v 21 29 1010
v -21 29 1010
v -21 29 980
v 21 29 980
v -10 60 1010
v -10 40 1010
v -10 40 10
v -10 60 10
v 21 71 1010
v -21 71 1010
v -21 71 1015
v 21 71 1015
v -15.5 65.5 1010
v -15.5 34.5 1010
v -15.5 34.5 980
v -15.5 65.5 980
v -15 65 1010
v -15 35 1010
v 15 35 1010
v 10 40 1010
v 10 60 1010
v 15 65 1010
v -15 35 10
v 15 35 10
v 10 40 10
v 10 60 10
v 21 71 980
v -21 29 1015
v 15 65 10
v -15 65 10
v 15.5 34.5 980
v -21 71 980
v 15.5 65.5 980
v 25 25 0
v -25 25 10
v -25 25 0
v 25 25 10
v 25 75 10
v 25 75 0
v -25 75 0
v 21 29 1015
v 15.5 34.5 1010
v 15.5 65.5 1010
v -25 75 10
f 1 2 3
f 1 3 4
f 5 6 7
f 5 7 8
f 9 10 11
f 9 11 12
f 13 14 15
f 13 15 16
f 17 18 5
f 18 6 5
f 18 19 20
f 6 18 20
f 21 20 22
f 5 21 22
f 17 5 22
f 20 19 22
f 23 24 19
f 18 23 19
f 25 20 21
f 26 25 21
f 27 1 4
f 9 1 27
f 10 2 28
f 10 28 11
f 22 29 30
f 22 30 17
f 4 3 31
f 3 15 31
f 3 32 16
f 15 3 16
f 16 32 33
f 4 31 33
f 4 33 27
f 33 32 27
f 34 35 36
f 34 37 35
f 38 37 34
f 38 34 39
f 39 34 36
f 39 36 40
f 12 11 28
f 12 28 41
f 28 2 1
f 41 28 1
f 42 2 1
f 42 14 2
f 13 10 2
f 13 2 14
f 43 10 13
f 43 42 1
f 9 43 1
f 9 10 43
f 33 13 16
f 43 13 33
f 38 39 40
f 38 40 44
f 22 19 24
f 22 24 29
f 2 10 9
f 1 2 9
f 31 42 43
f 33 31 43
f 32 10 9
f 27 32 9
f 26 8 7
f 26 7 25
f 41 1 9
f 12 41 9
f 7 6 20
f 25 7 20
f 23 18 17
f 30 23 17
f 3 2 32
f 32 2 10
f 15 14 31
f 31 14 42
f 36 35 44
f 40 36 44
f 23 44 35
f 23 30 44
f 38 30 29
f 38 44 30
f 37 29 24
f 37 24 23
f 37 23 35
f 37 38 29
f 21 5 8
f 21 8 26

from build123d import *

# Parameters (mm, degrees)
F0_W          = 30
F0_H          = 1000
F1_DEPTH      = 15
F1_DEPTH_BACK = 15
F2_DEPTH      = 25
F2_DEPTH_BACK = 25
F3_W          = 20
F3_H          = 20
F4_DEPTH      = 1000
F5_W          = 42
F5_H          = 42
F5_W_2        = 31
F5_H_2        = 31
F6_DEPTH      = 30
F7_W          = 42
F7_H          = 42
F8_DEPTH      = 5


with BuildPart() as f1:
    # F0 (on Right) → F1 (new body, two sides)
    with BuildSketch(Plane.YZ) as f1_sk:
        with Locations((50, 510)):
            Rectangle(F0_W, F0_H)
    extrude(amount=F1_DEPTH)
    extrude(f1_sk.sketch, amount=-F1_DEPTH_BACK)

    # F0 (on Right) → F2 (join, two sides)
    with BuildSketch(Plane.YZ) as f2_sk:
        Polygon((65, 10), (35, 10), (25, 10), (25, 0), (75, 0), (75, 10), align=None)
    extrude(amount=F2_DEPTH)
    extrude(f2_sk.sketch, amount=-F2_DEPTH_BACK)

    # F3 (on face) → F4 (cut)
    with BuildSketch(Plane.XY.offset(1010)):
        with Locations((0, 50)):
            Rectangle(F3_W, F3_H)
    extrude(amount=-F4_DEPTH, mode=Mode.SUBTRACT)


with BuildPart() as f6:
    # F5 (on face) → F6 (new body)
    with BuildSketch(Plane.XY.offset(1010)):
        with Locations((0, 50)):
            Rectangle(F5_W, F5_H)
        with Locations((0, 50)):
            Rectangle(F5_W_2, F5_H_2, mode=Mode.SUBTRACT)
    extrude(amount=-F6_DEPTH)


with BuildPart() as f8:
    # F7 (on face) → F8 (new body)
    with BuildSketch(Plane.XY.offset(1010)):
        with Locations((0, 50)):
            Rectangle(F7_W, F7_H)
    extrude(amount=F8_DEPTH)


solid = Compound([f1.part, f6.part, f8.part])
